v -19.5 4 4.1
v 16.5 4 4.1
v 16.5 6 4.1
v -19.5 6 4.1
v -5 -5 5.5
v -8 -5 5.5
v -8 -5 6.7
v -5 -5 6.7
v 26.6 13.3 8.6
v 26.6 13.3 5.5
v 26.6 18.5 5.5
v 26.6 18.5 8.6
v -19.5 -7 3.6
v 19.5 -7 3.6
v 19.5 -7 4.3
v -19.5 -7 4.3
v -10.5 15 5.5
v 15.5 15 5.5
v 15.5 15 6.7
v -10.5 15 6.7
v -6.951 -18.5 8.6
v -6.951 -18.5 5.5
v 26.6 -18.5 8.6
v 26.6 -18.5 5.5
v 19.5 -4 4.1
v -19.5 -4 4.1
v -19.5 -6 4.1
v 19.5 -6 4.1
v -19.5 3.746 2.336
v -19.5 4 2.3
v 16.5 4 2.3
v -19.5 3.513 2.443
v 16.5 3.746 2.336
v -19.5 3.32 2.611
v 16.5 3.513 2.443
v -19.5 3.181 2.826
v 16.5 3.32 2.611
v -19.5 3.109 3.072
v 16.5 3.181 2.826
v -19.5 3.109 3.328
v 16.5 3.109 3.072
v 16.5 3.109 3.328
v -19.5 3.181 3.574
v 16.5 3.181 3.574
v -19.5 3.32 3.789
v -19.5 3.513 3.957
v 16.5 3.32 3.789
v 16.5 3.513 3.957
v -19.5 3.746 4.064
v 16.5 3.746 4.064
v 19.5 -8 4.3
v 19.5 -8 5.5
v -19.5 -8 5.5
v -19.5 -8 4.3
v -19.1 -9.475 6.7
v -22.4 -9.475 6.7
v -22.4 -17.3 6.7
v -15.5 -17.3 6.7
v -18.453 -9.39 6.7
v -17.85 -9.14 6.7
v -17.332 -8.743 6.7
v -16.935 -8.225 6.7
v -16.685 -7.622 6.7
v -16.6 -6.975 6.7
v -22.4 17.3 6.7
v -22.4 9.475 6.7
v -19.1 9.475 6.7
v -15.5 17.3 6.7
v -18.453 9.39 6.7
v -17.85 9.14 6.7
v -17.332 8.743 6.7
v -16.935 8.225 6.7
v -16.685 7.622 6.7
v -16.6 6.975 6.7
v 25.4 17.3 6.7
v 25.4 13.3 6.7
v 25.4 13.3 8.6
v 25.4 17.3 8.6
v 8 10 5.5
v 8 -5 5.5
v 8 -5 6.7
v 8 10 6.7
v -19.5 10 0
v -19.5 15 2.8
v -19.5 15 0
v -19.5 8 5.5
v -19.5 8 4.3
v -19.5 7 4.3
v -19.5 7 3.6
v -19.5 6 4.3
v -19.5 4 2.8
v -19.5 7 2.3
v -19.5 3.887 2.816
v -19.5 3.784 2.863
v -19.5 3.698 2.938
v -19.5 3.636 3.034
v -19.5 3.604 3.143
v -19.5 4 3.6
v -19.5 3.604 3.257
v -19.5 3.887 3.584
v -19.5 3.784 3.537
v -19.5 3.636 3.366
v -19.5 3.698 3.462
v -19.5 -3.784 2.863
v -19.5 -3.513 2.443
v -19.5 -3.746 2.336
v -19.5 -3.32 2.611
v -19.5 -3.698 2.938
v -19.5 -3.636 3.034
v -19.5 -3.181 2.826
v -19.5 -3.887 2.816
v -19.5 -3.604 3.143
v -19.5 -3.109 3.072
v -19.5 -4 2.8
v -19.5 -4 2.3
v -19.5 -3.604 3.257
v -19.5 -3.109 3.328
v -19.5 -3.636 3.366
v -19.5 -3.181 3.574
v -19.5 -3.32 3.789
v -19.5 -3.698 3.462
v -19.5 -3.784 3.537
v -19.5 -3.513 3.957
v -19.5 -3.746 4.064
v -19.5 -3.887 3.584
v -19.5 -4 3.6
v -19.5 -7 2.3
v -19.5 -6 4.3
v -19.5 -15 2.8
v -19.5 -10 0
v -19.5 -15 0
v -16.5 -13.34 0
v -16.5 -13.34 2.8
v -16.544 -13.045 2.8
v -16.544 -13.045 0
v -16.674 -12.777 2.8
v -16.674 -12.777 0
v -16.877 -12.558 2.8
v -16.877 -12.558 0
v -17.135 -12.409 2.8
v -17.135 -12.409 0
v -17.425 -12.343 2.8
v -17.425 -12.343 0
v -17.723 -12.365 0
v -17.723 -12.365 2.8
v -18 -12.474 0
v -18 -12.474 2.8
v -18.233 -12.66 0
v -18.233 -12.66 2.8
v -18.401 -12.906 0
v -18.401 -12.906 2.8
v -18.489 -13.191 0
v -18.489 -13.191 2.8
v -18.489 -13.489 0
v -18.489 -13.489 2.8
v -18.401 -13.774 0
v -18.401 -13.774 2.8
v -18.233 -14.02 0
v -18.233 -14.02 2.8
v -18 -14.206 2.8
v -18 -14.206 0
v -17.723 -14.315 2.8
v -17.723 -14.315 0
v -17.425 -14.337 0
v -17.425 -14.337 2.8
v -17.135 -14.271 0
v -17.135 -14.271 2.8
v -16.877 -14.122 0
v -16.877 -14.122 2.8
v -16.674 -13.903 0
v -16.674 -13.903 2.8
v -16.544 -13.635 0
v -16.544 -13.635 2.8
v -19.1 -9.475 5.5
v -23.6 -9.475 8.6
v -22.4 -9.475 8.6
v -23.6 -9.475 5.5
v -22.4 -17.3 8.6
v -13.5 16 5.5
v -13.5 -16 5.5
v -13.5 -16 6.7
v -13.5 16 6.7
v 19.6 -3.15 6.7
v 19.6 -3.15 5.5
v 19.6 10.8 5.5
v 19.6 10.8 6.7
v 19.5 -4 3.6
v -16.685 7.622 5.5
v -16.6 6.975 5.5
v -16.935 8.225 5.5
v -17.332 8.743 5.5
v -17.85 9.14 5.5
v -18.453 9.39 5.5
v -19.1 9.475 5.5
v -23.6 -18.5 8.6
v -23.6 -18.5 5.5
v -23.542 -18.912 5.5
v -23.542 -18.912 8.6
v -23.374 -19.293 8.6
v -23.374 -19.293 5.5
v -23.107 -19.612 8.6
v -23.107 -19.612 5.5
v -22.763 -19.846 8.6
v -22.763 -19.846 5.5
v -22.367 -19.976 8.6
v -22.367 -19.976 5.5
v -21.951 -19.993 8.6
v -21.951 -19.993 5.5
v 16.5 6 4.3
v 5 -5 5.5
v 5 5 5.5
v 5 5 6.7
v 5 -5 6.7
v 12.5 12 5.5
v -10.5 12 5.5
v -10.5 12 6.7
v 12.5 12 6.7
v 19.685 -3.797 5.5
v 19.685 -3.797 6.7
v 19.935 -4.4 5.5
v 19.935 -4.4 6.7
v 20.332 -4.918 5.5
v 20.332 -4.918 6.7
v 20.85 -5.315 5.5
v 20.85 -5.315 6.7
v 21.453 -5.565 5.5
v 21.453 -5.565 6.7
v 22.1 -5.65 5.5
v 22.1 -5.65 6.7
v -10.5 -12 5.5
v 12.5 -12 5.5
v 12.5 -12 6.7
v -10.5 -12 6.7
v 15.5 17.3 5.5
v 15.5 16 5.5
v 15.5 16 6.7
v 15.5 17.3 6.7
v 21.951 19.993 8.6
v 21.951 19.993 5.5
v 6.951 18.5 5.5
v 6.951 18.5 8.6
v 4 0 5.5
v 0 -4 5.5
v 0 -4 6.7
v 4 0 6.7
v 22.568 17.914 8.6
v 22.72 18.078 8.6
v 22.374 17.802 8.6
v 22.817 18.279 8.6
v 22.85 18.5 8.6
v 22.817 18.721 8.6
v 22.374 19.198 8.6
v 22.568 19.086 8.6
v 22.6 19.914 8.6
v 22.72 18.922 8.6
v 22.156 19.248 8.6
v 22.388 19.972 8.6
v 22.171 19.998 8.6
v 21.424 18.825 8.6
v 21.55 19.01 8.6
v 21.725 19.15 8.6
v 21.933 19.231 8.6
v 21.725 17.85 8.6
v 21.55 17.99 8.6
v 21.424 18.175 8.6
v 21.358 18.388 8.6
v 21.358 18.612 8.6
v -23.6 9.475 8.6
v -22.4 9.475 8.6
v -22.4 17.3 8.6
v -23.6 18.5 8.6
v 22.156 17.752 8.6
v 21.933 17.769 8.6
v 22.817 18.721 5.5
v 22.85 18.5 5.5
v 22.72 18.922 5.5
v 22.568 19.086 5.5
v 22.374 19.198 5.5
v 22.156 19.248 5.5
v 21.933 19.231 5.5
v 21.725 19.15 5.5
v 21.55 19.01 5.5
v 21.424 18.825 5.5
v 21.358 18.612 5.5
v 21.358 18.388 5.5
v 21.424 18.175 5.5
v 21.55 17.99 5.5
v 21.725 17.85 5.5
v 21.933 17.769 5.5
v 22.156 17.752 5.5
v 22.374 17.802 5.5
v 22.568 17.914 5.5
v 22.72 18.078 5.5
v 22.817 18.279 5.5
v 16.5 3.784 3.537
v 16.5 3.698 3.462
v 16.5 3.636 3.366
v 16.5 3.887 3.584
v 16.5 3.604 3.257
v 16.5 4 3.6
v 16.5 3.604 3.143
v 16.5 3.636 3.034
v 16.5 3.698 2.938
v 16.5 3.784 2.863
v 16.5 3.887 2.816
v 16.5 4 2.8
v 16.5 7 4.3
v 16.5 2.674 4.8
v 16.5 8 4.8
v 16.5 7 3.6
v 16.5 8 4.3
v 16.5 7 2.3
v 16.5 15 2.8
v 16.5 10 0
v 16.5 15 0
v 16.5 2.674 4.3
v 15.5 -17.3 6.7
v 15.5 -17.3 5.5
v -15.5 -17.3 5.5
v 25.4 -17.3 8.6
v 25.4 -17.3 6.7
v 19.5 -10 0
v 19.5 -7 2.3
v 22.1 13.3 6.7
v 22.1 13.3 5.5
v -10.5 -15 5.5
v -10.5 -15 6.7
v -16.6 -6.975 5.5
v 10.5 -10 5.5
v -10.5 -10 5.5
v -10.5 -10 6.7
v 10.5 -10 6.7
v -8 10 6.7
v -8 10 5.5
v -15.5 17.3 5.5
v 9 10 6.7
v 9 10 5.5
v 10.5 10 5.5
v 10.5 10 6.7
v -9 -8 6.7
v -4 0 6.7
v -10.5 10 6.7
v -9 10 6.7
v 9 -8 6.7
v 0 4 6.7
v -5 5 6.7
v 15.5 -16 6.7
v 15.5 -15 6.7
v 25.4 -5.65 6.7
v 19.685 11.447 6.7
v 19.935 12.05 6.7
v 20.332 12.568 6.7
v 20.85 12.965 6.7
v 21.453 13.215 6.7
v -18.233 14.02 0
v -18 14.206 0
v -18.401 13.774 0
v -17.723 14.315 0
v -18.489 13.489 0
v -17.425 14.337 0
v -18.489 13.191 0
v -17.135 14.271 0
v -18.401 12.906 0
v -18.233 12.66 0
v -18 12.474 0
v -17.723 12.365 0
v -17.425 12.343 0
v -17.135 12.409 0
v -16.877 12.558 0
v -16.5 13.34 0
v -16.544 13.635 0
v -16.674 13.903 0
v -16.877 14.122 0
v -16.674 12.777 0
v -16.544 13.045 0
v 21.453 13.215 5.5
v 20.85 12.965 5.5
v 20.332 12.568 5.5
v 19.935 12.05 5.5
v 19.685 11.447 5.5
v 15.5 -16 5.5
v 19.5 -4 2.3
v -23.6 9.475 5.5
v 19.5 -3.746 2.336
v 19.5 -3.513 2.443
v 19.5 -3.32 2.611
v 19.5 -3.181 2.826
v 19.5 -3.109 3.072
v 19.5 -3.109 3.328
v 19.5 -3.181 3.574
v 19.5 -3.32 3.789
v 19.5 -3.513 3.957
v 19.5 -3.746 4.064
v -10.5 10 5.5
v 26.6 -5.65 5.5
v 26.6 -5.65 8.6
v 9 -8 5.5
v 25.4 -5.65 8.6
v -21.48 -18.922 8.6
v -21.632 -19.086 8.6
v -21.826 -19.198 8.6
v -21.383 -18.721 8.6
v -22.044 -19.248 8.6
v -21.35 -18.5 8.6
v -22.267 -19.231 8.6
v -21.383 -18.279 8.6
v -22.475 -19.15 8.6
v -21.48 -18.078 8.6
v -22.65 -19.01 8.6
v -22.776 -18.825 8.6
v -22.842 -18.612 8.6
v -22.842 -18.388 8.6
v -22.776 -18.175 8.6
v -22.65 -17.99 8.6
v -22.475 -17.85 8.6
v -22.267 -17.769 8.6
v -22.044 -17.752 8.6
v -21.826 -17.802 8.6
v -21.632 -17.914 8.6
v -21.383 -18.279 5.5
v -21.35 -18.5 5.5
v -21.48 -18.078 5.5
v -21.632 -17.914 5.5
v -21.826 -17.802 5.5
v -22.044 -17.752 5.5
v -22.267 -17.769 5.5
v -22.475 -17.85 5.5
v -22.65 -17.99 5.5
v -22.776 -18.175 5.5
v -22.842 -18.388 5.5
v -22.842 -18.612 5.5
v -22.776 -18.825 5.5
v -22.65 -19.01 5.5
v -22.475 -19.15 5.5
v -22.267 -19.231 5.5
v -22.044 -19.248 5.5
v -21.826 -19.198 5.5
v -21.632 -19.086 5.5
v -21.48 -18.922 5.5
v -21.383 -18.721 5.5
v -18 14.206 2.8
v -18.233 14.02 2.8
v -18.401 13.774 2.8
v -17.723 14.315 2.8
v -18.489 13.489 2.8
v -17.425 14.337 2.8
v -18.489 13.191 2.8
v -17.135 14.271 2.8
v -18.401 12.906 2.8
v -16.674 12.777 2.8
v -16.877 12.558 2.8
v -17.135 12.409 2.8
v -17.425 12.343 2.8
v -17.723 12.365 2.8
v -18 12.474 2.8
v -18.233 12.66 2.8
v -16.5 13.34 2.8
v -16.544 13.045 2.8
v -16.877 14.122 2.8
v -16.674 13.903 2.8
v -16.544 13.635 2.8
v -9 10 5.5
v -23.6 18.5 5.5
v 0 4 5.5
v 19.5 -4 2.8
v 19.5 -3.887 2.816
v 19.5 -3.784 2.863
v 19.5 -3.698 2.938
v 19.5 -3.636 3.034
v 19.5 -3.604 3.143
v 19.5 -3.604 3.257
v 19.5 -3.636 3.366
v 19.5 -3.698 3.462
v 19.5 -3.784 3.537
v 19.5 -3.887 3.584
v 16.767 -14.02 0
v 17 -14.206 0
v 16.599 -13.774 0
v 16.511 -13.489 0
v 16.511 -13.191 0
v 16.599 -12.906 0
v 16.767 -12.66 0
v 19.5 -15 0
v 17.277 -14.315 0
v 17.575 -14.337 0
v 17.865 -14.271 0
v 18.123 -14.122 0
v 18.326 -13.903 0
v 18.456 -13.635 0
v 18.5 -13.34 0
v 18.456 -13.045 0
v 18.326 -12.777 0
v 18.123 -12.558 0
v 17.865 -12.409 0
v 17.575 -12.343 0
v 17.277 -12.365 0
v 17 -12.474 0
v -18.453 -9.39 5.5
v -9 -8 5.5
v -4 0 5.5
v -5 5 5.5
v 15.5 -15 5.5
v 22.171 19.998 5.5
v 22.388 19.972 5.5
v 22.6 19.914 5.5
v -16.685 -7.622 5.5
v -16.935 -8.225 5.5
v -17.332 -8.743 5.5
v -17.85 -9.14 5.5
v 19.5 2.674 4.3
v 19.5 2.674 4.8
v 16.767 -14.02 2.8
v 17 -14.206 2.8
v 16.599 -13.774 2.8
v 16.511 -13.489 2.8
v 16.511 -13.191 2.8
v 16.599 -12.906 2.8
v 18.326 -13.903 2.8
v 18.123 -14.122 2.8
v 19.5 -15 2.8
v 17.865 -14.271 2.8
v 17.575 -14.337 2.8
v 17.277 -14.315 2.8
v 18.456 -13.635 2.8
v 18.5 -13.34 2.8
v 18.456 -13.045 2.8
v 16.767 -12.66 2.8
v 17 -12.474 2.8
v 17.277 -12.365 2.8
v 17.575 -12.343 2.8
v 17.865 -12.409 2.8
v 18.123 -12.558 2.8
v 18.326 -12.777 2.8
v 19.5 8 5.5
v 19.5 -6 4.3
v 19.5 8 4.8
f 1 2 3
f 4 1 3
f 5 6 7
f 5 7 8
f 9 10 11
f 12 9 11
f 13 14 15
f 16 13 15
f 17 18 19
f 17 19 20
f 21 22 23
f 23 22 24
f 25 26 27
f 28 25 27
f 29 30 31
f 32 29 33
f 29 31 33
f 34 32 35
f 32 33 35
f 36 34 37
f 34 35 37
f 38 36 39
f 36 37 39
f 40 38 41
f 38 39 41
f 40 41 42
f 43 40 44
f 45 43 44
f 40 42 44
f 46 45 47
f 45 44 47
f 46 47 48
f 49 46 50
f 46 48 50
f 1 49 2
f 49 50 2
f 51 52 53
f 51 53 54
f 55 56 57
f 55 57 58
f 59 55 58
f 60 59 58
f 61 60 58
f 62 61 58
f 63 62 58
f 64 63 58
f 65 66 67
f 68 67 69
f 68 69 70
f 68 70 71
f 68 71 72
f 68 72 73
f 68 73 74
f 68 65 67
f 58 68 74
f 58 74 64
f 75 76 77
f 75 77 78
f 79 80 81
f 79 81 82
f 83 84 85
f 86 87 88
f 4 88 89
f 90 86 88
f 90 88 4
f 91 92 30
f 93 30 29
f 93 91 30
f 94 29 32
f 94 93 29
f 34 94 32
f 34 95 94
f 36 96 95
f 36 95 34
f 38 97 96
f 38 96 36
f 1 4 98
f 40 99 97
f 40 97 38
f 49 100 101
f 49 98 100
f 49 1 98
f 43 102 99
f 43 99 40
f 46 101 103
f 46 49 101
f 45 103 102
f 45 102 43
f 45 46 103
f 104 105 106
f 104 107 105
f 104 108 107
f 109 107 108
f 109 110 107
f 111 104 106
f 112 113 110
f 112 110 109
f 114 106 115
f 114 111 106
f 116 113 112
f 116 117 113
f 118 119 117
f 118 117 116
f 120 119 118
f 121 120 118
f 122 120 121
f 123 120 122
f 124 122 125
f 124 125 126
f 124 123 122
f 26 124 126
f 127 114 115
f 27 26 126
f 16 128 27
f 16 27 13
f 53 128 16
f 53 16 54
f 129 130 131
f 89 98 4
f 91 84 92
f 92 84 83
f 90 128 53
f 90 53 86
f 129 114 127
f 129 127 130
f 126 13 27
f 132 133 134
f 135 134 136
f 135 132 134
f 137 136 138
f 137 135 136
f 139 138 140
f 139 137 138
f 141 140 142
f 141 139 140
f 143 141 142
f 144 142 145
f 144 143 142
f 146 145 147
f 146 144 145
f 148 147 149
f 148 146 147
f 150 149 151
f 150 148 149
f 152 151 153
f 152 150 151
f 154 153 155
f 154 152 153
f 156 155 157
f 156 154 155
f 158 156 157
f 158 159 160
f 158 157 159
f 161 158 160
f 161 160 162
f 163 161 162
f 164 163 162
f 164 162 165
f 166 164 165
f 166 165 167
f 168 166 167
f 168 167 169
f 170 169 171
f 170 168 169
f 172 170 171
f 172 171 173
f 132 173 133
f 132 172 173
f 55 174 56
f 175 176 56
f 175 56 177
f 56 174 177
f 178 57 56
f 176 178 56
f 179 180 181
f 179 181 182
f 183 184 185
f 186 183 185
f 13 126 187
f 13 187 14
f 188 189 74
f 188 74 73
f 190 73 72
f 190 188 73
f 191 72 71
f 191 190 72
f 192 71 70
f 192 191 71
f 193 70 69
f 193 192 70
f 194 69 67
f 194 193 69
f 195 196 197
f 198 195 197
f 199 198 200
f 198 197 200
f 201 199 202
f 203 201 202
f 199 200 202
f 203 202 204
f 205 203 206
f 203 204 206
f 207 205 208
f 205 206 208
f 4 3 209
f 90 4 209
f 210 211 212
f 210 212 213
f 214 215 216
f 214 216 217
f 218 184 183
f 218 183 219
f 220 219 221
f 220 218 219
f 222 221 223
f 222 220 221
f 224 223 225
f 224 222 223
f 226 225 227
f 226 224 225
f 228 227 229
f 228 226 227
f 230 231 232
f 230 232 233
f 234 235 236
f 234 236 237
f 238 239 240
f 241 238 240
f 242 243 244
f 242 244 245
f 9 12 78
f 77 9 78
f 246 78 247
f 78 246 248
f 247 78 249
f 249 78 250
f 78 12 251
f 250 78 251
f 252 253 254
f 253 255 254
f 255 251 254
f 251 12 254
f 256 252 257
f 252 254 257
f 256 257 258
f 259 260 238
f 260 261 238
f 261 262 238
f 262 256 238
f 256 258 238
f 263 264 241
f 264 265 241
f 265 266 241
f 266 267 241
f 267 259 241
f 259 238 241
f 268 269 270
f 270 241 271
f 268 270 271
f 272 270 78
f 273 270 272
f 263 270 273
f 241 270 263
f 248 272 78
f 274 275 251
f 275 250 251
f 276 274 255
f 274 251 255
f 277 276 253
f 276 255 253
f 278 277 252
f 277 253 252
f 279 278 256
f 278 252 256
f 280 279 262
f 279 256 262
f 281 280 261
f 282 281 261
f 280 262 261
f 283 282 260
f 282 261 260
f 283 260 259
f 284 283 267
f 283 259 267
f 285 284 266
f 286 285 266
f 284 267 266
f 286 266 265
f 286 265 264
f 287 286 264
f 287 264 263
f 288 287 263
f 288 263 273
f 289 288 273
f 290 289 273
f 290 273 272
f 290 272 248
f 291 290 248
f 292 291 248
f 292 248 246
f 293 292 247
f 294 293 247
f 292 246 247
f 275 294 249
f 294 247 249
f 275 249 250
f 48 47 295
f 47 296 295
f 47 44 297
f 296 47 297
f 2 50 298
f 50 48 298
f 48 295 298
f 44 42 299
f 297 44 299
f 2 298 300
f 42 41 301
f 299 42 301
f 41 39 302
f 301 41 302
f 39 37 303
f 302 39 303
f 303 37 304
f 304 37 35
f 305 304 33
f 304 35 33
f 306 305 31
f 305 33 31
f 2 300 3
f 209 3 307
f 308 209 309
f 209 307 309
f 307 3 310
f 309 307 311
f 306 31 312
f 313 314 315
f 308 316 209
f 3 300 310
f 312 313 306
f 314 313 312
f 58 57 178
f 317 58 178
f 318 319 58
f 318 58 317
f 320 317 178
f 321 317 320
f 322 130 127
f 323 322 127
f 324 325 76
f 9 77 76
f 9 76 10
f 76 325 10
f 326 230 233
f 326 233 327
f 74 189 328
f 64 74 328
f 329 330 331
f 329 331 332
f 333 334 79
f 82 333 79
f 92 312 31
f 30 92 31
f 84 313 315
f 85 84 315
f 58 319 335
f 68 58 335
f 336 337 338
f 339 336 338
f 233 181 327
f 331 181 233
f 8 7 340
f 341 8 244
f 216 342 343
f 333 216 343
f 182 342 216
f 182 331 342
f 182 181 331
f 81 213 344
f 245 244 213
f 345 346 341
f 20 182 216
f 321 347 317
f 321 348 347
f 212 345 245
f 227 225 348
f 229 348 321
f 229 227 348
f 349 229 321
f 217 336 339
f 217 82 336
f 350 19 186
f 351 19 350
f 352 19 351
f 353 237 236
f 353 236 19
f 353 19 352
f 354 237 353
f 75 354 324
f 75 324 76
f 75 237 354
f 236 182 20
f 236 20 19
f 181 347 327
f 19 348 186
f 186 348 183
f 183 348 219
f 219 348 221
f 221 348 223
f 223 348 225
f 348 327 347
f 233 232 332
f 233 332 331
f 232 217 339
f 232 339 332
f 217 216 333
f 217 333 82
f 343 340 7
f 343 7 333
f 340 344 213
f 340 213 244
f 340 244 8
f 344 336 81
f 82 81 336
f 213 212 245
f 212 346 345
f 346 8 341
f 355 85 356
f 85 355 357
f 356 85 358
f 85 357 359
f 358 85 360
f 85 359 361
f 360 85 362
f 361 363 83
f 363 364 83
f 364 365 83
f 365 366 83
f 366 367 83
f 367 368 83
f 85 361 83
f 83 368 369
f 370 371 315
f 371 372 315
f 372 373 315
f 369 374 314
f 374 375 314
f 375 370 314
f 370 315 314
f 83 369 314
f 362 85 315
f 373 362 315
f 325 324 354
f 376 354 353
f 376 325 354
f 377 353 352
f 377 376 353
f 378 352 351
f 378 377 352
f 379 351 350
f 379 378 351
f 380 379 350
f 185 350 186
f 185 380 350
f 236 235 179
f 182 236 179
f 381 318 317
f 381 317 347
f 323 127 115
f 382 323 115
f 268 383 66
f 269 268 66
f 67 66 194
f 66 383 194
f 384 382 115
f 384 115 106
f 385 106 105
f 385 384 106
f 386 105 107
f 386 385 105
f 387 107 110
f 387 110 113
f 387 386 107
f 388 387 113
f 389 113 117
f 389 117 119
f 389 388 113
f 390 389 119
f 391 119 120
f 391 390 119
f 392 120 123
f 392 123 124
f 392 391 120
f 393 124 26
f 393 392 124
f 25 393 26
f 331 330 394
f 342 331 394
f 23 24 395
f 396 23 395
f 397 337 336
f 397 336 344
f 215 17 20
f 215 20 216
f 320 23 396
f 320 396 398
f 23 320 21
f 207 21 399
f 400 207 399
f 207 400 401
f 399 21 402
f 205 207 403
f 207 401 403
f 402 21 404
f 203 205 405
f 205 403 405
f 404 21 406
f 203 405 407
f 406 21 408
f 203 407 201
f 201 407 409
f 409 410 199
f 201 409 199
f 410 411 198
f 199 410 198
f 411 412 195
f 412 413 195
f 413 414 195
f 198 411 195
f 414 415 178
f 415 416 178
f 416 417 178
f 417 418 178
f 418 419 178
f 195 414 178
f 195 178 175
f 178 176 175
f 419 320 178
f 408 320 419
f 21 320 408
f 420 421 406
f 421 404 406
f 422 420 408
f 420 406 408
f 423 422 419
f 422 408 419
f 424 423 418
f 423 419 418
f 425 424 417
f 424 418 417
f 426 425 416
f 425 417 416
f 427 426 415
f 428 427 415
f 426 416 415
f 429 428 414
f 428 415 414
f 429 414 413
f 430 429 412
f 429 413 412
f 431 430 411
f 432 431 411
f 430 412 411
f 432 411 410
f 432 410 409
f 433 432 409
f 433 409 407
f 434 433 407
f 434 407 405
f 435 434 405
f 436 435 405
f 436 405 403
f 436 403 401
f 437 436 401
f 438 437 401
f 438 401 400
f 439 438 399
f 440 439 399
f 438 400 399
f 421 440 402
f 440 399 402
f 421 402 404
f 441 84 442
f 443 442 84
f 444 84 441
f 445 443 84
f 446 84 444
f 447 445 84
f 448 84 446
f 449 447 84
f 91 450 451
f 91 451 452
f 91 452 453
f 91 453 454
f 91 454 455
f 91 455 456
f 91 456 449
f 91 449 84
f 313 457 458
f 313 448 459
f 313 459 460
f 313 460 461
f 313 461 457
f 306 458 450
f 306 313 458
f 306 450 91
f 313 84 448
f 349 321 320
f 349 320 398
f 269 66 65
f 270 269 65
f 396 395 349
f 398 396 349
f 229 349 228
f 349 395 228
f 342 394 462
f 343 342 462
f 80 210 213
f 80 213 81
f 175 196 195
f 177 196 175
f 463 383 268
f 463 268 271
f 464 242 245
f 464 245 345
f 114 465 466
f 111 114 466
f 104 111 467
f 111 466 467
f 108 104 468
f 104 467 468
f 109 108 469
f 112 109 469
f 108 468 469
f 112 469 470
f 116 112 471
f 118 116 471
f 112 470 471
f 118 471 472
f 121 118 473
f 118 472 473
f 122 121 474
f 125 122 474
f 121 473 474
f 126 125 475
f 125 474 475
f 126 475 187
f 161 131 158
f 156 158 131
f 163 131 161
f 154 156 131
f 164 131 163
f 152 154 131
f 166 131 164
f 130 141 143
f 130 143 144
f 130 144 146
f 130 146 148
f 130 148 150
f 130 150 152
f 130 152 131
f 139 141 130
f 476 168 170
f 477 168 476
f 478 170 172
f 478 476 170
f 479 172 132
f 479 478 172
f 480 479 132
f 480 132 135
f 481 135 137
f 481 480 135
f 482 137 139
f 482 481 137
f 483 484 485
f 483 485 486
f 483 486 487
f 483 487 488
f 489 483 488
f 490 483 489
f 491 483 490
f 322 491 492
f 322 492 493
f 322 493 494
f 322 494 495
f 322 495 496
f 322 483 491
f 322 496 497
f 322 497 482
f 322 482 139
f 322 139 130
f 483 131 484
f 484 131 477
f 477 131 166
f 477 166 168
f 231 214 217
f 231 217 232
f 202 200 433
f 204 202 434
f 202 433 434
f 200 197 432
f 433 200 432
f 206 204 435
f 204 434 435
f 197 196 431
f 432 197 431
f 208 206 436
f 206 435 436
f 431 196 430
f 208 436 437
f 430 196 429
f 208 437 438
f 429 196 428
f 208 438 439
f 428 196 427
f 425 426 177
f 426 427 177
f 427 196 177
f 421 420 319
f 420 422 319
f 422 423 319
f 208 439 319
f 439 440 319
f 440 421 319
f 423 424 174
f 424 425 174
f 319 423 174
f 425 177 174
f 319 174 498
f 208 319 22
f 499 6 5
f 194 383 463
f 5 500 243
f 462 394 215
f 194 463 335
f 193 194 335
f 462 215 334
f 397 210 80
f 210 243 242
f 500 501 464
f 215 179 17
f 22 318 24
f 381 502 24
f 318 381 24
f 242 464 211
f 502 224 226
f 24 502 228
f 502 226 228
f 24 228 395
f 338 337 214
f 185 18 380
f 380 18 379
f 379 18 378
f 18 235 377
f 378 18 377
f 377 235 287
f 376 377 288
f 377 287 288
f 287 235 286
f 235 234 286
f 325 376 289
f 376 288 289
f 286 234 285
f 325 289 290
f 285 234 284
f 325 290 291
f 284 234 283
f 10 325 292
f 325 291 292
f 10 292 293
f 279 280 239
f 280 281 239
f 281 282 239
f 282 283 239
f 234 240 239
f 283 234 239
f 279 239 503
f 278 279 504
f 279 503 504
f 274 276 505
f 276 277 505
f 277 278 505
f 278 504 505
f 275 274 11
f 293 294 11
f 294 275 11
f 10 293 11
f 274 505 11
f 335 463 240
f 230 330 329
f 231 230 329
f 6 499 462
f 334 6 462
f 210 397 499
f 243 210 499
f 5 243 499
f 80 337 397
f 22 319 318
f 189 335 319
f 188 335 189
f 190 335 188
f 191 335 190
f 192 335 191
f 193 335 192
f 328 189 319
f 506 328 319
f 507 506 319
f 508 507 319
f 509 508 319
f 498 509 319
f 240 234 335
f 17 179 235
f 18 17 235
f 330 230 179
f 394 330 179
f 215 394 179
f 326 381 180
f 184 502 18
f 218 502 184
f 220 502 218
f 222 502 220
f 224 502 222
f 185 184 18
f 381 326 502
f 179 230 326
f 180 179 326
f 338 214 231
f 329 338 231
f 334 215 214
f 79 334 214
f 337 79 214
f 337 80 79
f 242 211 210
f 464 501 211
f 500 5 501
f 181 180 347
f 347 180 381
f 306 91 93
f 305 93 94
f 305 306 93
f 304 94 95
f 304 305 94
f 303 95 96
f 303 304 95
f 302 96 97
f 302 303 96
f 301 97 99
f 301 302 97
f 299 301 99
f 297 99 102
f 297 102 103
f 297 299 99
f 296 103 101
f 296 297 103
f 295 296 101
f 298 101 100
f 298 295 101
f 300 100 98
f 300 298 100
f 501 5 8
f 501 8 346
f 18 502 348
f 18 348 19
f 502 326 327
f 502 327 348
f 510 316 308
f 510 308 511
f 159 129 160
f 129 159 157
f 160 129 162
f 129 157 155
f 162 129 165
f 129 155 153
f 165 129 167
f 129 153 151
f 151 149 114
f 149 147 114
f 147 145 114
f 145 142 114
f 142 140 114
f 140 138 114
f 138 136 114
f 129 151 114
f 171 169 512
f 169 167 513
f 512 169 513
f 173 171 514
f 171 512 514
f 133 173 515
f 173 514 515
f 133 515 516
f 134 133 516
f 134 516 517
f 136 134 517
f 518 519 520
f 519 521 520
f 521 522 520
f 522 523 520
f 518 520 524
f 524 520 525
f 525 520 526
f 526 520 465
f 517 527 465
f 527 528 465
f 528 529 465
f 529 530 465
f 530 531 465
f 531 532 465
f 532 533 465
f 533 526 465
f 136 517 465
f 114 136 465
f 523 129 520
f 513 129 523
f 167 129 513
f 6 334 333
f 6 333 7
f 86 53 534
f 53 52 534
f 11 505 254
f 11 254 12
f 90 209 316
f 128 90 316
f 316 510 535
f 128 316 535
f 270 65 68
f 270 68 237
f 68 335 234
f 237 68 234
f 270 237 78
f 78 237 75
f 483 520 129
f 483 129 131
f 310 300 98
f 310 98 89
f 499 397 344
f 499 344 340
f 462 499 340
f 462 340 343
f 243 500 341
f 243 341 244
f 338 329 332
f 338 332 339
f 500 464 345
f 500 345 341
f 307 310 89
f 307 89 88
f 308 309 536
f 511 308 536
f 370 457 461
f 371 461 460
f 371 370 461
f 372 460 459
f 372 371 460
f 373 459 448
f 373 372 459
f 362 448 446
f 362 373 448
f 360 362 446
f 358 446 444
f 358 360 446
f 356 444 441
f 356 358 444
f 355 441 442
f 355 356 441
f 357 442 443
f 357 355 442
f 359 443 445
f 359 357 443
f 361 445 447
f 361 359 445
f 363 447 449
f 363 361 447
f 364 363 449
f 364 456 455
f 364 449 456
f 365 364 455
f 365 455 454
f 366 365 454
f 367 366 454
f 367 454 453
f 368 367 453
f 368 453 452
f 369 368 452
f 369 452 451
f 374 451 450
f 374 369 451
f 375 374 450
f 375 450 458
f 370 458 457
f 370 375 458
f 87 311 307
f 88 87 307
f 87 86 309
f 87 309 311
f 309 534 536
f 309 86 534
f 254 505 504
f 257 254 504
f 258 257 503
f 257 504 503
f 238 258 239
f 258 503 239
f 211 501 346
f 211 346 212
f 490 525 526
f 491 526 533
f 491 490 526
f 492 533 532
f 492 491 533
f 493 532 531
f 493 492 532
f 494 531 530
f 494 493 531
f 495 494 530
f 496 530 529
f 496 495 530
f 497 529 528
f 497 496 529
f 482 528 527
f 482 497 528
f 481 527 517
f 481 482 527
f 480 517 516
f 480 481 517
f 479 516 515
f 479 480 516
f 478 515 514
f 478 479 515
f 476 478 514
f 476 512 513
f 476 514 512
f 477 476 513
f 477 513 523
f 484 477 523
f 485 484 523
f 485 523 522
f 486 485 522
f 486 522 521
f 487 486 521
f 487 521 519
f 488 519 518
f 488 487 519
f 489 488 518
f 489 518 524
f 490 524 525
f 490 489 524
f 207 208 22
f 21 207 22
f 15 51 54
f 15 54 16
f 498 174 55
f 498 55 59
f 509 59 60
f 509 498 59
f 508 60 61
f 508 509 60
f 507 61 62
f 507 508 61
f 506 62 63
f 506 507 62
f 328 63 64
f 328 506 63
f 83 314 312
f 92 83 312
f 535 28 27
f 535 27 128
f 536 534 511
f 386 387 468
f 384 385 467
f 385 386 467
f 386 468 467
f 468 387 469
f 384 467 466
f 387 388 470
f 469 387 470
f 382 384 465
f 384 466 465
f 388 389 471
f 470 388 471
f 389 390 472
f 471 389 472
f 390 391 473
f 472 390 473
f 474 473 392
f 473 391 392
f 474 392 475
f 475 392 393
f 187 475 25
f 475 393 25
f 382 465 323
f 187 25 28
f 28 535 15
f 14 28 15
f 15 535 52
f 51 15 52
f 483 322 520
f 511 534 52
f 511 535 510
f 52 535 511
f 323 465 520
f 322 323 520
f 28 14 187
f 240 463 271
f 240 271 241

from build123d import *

# Parameters (mm, degrees)
SKETCH007_W       = 50.2
SKETCH007_H       = 37
PAD005_DEPTH      = 1.2
SKETCH008_W       = 47.8
SKETCH008_H       = 34.6
PAD006_DEPTH      = 3.1
POCKET001_DEPTH   = 3.101
SKETCH005_W       = 31
SKETCH005_H       = 34.6
POCKET002_DEPTH   = 5
SKETCH023_W       = 21
SKETCH023_H       = 20
PAD_DEPTH         = 1.2
PAD015_DEPTH      = 1.2
SKETCH013_R       = 0.75
POCKET_DEPTH      = 2.601
POCKET_DEPTH_BACK = 0.501
PAD016_DEPTH      = 19.5
SKETCH_R          = 1
POCKET003_DEPTH   = 5
SKETCH022_W       = 12.944488
SKETCH022_H       = 13.720411
POCKET004_DEPTH   = 4.8


with BuildPart() as plastic_tek1_display_interface_top_part:
    # Sketch007 (on DatumPlane) → Pad005 (new body)
    with BuildSketch(Plane.XY.offset(5.5)):
        with Locations((1.5, 0)):
            Rectangle(SKETCH007_W, SKETCH007_H)
    extrude(amount=PAD005_DEPTH)

    # Sketch008 (on DatumPlane) → Pad006 (join)
    with BuildSketch(Plane.XY.offset(5.5)):
        with BuildLine():
            Line((-23.6, -18.5), (-23.6, 18.5))
            Line((-23.6, 18.5), (6.951471, 18.5))
            Line((21.951471, 19.992628), (6.951471, 18.5))
            ThreePointArc((22.6, 19.914214), (22.280056, 19.989154), (21.951471, 19.992628))
            Line((22.6, 19.914214), (26.6, 18.5))
            Line((26.6, 18.5), (26.6, -18.5))
            Line((26.6, -18.5), (-6.951471, -18.5))
            Line((-21.951471, -19.992628), (-6.951471, -18.5))
            ThreePointArc((-23.6, -18.5), (-23.106779, -19.611934), (-21.951471, -19.992628))
        make_face()
        with Locations((1.5, 0)):
            Rectangle(SKETCH008_W, SKETCH008_H, mode=Mode.SUBTRACT)
    extrude(amount=PAD006_DEPTH)

    # Sketch009 (on DatumPlane) → Pocket001 (cut, through all)
    with BuildSketch(Plane.XY.offset(5.5)):
        with BuildLine():
            Line((19.6, -3.15), (19.6, 10.8))
            ThreePointArc((22.1, 13.3), (20.332233, 12.567767), (19.6, 10.8))
            Line((22.1, 13.3), (26.6, 13.3))
            Line((26.6, 13.3), (26.6, -5.65))
            Line((26.6, -5.65), (22.1, -5.65))
            ThreePointArc((19.6, -3.15), (20.332233, -4.917767), (22.1, -5.65))
        make_face()
        with BuildLine():
            Line((-23.6, 9.475), (-19.1, 9.475))
            ThreePointArc((-16.6, 6.975), (-17.332233, 8.742767), (-19.1, 9.475))
            Line((-16.6, 6.975), (-16.6, -6.975))
            ThreePointArc((-19.1, -9.475), (-17.332233, -8.742767), (-16.6, -6.975))
            Line((-19.1, -9.475), (-23.6, -9.475))
            Line((-23.6, -9.475), (-23.6, 9.475))
        make_face()
    extrude(amount=POCKET001_DEPTH, mode=Mode.SUBTRACT)

    # Sketch005 (on DatumPlane) → Pocket002 (cut)
    with BuildSketch(Plane.XY.offset(5.5)):
        Rectangle(SKETCH005_W, SKETCH005_H)
    extrude(amount=POCKET002_DEPTH, mode=Mode.SUBTRACT)

    # Sketch023 (on DatumPlane) → Pad (join)
    with BuildSketch(Plane.XY.offset(5.5)):
        Polygon((-13.5, -16), (-13.5, 16), (-10.5, 16), (15.5, 16), (15.5, 15), (-10.5, 15), (-10.5, 12), (12.5, 12), (12.5, -12), (-10.5, -12), (-10.5, -15), (15.5, -15), (15.5, -16), (-10.5, -16), align=None)
        Rectangle(SKETCH023_W, SKETCH023_H, mode=Mode.SUBTRACT)
    extrude(amount=PAD_DEPTH)

    # Sketch020 (on DatumPlane) → Pad015 (join)
    with BuildSketch(Plane.XY.offset(5.5)):
        Polygon((-5, -5), (-5, 5), (5, 5), (5, -5), (8, -5), (8, 10), (9, 10), (9, -8), (-9, -8), (-9, 10), (-8, 10), (-8, -5), align=None)
        Polygon((4, 0), (0, 4), (-4, 0), (0, -4), align=None, mode=Mode.SUBTRACT)
    extrude(amount=PAD015_DEPTH)

    # Sketch013 (on DatumPlane) → Pocket (cut, two sides)
    with BuildSketch(Plane.XY.offset(8.1)) as pocket_sk:
        with Locations((22.1, 18.5)):
            Circle(SKETCH013_R)
        with Locations((-22.1, -18.5)):
            Circle(SKETCH013_R)
    extrude(amount=-POCKET_DEPTH, mode=Mode.SUBTRACT)
    extrude(pocket_sk.sketch, amount=POCKET_DEPTH_BACK, mode=Mode.SUBTRACT)


with BuildPart() as body002:
    # Sketch021 → Pad016 (new body, symmetric)
    with BuildSketch(Plane.YZ):
        with BuildLine():
            Line((0, 5.5), (-8, 5.5))
            Line((-8, 5.5), (-8, 4.3))
            Line((-8, 4.3), (-7, 4.3))
            Line((-7, 3.6), (-7, 4.3))
            Line((-4, 3.6), (-7, 3.6))
            ThreePointArc((-4, 2.8), (-3.6, 3.2), (-4, 3.6))
            Line((-10, 2.8), (-4, 2.8))
            Line((-15, 2.8), (-10, 2.8))
            Line((-15, 2.8), (-15, 0))
            Line((-15, 0), (-10, 0))
            Line((-10, 0), (-7, 2.3))
            Line((-7, 2.3), (-4, 2.3))
            ThreePointArc((-4, 2.3), (-3.1, 3.2), (-4, 4.1))
            Line((-4, 4.1), (-6, 4.1))
            Line((-6, 4.1), (-6, 4.3))
            Line((-5.65359, 4.3), (-6, 4.3))
            Line((-5.65359, 4.3), (0, 4.3))
            Line((0, 4.3), (0, 5.5))
        make_face()
    pad016 = extrude(amount=PAD016_DEPTH, both=True)

    # Mirrored003: Pad016 across Sketch021 V_Axis
    add(pad016.mirror(Plane(origin=(0, 0, 0), x_dir=(1, 0, 0), z_dir=(0, 1, 0))))

    # Sketch → Pocket003 (cut)
    with BuildSketch(Plane.XY):
        with Locations((-17.5, 13.34)):
            Circle(SKETCH_R)
        with Locations((-17.5, -13.34)):
            Circle(SKETCH_R)
        with Locations((17.5, 13.34)):
            Circle(SKETCH_R)
        with Locations((17.5, -13.34)):
            Circle(SKETCH_R)
    extrude(amount=POCKET003_DEPTH, mode=Mode.SUBTRACT)

    # Sketch022 → Pocket004 (cut)
    with BuildSketch(Plane.XY):
        with Locations((22.972244, 9.533887)):
            Rectangle(SKETCH022_W, SKETCH022_H)
    extrude(amount=POCKET004_DEPTH, mode=Mode.SUBTRACT)


solid = Compound([plastic_tek1_display_interface_top_part.part, body002.part])
